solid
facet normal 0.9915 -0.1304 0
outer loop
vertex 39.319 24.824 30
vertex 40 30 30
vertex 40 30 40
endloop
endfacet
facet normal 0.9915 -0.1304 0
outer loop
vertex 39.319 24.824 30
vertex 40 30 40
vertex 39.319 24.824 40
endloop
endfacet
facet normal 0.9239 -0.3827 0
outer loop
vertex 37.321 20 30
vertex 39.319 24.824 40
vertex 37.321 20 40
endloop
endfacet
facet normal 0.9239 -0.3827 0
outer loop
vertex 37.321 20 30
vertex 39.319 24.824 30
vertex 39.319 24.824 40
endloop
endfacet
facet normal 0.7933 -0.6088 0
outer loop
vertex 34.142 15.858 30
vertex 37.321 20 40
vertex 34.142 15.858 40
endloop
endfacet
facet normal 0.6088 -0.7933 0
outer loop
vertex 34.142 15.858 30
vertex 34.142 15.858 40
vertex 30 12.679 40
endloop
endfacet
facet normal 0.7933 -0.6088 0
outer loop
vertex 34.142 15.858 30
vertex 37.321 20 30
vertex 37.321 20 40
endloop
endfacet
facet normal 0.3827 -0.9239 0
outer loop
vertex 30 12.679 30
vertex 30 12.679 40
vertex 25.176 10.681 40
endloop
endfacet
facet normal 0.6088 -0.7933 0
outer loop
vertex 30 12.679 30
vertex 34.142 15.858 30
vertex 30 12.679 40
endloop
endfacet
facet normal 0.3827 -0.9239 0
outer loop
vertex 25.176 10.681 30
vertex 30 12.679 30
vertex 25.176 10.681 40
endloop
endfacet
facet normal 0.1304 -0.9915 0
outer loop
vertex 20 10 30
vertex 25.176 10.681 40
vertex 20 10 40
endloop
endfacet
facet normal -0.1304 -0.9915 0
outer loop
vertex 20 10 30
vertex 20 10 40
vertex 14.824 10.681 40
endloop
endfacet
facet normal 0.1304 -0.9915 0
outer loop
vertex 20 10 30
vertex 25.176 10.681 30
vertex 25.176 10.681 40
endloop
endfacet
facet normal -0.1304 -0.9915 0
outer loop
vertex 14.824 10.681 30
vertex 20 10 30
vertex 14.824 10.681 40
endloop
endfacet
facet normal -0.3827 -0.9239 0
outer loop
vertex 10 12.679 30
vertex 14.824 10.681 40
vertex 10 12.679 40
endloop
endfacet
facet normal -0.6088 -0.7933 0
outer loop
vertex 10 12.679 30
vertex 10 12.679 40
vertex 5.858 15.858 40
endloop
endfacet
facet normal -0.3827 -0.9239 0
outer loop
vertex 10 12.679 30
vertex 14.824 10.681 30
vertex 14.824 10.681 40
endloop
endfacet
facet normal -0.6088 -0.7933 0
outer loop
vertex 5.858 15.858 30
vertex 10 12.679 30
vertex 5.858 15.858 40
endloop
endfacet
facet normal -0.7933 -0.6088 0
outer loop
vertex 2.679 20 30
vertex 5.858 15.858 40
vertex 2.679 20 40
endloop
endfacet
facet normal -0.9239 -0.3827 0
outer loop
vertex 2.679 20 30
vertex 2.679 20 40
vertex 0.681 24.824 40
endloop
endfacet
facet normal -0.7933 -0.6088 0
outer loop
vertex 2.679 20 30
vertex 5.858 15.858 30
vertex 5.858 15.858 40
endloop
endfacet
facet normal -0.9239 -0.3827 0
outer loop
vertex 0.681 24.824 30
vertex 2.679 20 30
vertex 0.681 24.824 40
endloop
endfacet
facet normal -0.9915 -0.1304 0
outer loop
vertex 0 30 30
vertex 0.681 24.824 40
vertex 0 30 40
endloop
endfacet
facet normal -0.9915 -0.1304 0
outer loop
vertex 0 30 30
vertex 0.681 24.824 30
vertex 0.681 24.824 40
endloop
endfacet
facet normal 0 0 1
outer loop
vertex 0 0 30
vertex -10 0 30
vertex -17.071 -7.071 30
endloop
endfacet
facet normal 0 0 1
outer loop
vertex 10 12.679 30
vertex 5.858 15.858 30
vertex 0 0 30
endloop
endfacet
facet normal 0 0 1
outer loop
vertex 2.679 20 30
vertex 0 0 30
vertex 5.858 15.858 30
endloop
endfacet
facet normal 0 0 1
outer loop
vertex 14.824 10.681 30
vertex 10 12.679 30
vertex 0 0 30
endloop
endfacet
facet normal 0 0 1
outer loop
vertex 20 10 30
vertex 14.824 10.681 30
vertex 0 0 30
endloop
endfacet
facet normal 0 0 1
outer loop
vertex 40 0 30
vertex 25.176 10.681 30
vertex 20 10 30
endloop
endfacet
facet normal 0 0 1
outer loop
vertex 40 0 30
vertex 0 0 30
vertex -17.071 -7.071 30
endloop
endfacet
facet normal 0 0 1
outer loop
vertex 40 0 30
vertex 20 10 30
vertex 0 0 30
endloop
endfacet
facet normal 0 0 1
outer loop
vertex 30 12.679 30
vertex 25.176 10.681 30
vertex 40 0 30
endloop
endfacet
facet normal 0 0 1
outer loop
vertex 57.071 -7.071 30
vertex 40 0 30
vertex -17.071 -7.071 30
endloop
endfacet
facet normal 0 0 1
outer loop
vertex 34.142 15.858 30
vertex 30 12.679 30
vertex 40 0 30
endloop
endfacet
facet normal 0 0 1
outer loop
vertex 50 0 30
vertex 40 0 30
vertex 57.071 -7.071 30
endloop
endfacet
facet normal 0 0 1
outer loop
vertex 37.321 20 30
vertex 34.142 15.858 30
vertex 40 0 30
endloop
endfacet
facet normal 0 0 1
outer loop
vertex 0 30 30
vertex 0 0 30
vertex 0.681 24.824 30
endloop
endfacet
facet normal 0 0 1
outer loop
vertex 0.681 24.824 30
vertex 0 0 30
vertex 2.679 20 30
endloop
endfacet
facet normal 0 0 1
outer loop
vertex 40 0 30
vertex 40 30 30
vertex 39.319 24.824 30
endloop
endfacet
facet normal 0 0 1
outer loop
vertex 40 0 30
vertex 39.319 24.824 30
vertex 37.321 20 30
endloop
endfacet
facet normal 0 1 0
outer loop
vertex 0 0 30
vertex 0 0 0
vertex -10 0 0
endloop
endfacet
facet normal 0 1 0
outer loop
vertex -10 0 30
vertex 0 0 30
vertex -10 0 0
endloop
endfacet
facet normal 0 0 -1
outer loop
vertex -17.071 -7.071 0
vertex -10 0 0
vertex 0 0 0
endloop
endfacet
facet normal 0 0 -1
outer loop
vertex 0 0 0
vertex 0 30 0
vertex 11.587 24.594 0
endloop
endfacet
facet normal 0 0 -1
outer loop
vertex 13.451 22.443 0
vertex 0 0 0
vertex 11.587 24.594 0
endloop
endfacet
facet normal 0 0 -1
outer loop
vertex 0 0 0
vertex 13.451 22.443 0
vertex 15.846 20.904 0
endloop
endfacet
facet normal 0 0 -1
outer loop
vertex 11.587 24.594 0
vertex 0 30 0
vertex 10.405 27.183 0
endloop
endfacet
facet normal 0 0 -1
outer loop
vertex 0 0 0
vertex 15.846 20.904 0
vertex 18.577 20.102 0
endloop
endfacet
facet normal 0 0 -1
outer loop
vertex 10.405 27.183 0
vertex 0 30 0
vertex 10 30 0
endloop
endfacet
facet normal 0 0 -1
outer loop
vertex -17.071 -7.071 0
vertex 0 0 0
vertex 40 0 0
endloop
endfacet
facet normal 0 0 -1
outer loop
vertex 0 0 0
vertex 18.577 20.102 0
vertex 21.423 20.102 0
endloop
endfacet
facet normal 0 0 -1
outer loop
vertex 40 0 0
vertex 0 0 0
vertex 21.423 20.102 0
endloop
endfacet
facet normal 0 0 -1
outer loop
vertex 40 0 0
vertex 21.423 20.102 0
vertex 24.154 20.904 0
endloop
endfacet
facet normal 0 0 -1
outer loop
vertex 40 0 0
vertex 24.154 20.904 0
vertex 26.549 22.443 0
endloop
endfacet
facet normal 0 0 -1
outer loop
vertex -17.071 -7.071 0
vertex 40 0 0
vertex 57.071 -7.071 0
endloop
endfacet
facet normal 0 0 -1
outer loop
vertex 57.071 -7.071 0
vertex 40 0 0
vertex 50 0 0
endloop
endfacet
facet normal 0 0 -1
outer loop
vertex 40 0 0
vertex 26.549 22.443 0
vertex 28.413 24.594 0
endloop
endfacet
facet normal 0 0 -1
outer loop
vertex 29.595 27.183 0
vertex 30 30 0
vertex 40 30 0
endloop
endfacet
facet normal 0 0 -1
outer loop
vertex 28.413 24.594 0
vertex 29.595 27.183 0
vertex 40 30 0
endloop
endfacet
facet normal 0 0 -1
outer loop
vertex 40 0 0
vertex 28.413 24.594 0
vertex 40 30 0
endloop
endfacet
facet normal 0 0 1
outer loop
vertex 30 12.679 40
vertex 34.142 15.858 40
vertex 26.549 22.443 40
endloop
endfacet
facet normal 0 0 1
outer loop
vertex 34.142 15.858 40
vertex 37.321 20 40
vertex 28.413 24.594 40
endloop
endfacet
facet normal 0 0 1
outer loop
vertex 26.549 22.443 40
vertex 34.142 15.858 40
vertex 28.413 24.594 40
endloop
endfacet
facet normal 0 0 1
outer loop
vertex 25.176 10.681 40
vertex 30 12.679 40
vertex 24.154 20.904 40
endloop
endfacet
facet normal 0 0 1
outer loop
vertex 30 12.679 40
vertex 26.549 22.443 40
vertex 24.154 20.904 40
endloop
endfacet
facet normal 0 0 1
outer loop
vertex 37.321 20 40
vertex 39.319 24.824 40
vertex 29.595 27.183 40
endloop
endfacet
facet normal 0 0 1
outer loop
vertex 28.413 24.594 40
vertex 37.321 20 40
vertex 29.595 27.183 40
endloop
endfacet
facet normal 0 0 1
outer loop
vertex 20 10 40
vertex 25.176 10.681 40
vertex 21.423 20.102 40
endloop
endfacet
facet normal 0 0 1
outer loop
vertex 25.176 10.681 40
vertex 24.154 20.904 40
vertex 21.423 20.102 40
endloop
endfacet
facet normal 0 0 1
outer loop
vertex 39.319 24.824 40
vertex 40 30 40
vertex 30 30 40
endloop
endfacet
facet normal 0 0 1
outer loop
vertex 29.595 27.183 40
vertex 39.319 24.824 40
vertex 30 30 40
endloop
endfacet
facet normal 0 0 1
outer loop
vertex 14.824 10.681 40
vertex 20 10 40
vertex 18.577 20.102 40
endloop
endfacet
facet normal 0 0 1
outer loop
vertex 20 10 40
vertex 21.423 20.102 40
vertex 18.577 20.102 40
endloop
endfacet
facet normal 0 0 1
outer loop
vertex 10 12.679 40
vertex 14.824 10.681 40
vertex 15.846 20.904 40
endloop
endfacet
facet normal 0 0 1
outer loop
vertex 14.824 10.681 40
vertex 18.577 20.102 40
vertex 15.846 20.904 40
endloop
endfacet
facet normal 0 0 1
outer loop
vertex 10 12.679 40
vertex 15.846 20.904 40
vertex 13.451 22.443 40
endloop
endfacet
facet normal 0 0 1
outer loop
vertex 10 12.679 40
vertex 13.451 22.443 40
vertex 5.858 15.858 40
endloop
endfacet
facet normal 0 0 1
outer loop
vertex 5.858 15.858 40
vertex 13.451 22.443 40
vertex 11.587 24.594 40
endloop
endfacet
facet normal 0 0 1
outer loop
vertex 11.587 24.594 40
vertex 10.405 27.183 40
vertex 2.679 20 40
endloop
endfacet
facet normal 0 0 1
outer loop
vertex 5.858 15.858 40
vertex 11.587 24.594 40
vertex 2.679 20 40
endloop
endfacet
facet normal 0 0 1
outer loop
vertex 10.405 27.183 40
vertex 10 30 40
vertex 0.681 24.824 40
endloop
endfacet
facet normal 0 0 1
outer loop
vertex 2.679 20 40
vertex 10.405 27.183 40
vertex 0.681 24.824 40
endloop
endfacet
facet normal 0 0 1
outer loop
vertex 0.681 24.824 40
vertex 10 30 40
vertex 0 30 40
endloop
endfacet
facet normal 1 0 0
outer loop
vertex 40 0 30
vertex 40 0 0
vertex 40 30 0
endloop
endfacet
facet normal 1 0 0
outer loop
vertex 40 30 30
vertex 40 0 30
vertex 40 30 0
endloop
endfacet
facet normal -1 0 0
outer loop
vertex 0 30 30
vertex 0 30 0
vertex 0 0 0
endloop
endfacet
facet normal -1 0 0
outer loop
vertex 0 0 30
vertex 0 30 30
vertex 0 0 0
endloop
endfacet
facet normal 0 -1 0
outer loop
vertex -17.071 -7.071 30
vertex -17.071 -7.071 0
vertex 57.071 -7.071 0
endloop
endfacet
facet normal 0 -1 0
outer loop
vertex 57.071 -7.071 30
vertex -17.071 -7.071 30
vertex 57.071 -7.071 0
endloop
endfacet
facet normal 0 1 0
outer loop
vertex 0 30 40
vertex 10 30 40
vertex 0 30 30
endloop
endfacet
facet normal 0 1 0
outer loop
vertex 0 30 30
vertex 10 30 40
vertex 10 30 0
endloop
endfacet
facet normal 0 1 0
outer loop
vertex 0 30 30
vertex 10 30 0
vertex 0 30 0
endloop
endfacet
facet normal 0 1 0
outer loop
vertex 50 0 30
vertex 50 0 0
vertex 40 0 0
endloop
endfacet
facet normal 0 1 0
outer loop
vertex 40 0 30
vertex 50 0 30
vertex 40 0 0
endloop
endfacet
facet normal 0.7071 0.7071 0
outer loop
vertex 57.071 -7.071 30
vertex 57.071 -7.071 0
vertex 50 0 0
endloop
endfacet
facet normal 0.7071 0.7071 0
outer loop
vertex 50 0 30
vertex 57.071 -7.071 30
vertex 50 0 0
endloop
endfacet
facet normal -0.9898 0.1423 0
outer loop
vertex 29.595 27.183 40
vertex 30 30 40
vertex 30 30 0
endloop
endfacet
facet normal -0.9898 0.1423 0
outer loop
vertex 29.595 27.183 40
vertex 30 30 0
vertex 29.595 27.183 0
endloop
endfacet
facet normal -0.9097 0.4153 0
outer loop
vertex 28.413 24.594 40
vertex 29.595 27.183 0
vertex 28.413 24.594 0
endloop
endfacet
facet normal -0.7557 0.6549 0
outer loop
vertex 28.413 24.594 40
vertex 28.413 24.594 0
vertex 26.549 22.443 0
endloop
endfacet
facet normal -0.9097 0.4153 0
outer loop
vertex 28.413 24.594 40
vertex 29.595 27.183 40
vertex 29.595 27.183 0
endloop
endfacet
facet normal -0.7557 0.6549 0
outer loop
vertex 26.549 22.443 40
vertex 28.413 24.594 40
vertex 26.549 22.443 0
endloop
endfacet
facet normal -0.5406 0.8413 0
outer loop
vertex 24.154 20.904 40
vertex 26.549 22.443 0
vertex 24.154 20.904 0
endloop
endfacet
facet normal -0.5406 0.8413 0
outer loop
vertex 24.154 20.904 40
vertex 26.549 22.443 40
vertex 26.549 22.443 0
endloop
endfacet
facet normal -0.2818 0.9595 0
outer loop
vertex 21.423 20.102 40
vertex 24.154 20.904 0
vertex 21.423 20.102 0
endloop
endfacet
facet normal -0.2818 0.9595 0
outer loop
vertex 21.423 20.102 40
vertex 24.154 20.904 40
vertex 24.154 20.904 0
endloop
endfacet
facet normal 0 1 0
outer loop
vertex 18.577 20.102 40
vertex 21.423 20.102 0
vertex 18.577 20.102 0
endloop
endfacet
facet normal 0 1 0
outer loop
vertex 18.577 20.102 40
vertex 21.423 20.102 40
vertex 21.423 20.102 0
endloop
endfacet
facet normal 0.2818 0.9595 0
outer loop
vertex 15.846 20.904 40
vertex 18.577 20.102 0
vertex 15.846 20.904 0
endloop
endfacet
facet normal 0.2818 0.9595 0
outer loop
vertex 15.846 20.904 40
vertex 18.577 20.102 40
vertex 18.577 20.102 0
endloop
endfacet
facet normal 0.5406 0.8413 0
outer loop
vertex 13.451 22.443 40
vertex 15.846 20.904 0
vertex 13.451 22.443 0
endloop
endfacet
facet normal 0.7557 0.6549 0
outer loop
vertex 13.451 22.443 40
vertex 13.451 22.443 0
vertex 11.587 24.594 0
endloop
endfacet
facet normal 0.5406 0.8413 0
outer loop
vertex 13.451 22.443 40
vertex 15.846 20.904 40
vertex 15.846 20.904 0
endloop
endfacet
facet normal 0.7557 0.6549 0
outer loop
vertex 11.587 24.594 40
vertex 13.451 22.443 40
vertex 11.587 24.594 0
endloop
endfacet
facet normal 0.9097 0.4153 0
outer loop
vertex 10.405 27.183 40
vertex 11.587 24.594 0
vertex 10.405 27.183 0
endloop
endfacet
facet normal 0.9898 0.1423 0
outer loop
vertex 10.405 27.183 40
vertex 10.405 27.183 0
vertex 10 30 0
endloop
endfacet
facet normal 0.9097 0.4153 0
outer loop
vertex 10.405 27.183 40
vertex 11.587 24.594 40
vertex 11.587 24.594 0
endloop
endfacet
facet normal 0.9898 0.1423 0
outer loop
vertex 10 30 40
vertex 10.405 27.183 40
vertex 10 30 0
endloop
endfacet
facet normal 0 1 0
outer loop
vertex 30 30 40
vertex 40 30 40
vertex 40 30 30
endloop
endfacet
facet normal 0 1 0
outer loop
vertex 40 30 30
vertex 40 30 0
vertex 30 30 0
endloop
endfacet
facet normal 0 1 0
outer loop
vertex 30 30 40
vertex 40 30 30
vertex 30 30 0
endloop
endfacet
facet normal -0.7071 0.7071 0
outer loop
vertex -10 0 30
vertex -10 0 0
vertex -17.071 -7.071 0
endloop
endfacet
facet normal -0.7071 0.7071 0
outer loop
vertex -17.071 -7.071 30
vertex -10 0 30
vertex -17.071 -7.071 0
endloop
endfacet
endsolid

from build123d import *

# Parameters (mm, degrees)
BOSS_EXTRUDE1_DEPTH = 30
BOSS_EXTRUDE2_DEPTH = 40
CUT_EXTRUDE1_DEPTH  = 40


with BuildPart() as part:
    # Sketch1 → Boss-Extrude1 (new body)
    with BuildSketch(Plane.XY):
        Polygon((0, 0), (-10, 0), (-17.071067812, -7.071067812), (57.071067812, -7.071067812), (50, 0), (40, 0), (40, 30), (0, 30), align=None)
    extrude(amount=BOSS_EXTRUDE1_DEPTH)

    # Sketch3 → Boss-Extrude2 (add)
    with BuildSketch(Plane.XY):
        with BuildLine():
            Line((0, 30), (40, 30))
            ThreePointArc((40, 30), (20, 10), (0, 30))
        make_face()
    extrude(amount=BOSS_EXTRUDE2_DEPTH)

    # Sketch4 → Cut-Extrude1 (cut)
    with BuildSketch(Plane.XY.offset(40)):
        with BuildLine():
            Line((10, 30), (30, 30))
            ThreePointArc((30, 30), (20, 20), (10, 30))
        make_face()
    extrude(amount=-CUT_EXTRUDE1_DEPTH, mode=Mode.SUBTRACT)


solid = part.part
